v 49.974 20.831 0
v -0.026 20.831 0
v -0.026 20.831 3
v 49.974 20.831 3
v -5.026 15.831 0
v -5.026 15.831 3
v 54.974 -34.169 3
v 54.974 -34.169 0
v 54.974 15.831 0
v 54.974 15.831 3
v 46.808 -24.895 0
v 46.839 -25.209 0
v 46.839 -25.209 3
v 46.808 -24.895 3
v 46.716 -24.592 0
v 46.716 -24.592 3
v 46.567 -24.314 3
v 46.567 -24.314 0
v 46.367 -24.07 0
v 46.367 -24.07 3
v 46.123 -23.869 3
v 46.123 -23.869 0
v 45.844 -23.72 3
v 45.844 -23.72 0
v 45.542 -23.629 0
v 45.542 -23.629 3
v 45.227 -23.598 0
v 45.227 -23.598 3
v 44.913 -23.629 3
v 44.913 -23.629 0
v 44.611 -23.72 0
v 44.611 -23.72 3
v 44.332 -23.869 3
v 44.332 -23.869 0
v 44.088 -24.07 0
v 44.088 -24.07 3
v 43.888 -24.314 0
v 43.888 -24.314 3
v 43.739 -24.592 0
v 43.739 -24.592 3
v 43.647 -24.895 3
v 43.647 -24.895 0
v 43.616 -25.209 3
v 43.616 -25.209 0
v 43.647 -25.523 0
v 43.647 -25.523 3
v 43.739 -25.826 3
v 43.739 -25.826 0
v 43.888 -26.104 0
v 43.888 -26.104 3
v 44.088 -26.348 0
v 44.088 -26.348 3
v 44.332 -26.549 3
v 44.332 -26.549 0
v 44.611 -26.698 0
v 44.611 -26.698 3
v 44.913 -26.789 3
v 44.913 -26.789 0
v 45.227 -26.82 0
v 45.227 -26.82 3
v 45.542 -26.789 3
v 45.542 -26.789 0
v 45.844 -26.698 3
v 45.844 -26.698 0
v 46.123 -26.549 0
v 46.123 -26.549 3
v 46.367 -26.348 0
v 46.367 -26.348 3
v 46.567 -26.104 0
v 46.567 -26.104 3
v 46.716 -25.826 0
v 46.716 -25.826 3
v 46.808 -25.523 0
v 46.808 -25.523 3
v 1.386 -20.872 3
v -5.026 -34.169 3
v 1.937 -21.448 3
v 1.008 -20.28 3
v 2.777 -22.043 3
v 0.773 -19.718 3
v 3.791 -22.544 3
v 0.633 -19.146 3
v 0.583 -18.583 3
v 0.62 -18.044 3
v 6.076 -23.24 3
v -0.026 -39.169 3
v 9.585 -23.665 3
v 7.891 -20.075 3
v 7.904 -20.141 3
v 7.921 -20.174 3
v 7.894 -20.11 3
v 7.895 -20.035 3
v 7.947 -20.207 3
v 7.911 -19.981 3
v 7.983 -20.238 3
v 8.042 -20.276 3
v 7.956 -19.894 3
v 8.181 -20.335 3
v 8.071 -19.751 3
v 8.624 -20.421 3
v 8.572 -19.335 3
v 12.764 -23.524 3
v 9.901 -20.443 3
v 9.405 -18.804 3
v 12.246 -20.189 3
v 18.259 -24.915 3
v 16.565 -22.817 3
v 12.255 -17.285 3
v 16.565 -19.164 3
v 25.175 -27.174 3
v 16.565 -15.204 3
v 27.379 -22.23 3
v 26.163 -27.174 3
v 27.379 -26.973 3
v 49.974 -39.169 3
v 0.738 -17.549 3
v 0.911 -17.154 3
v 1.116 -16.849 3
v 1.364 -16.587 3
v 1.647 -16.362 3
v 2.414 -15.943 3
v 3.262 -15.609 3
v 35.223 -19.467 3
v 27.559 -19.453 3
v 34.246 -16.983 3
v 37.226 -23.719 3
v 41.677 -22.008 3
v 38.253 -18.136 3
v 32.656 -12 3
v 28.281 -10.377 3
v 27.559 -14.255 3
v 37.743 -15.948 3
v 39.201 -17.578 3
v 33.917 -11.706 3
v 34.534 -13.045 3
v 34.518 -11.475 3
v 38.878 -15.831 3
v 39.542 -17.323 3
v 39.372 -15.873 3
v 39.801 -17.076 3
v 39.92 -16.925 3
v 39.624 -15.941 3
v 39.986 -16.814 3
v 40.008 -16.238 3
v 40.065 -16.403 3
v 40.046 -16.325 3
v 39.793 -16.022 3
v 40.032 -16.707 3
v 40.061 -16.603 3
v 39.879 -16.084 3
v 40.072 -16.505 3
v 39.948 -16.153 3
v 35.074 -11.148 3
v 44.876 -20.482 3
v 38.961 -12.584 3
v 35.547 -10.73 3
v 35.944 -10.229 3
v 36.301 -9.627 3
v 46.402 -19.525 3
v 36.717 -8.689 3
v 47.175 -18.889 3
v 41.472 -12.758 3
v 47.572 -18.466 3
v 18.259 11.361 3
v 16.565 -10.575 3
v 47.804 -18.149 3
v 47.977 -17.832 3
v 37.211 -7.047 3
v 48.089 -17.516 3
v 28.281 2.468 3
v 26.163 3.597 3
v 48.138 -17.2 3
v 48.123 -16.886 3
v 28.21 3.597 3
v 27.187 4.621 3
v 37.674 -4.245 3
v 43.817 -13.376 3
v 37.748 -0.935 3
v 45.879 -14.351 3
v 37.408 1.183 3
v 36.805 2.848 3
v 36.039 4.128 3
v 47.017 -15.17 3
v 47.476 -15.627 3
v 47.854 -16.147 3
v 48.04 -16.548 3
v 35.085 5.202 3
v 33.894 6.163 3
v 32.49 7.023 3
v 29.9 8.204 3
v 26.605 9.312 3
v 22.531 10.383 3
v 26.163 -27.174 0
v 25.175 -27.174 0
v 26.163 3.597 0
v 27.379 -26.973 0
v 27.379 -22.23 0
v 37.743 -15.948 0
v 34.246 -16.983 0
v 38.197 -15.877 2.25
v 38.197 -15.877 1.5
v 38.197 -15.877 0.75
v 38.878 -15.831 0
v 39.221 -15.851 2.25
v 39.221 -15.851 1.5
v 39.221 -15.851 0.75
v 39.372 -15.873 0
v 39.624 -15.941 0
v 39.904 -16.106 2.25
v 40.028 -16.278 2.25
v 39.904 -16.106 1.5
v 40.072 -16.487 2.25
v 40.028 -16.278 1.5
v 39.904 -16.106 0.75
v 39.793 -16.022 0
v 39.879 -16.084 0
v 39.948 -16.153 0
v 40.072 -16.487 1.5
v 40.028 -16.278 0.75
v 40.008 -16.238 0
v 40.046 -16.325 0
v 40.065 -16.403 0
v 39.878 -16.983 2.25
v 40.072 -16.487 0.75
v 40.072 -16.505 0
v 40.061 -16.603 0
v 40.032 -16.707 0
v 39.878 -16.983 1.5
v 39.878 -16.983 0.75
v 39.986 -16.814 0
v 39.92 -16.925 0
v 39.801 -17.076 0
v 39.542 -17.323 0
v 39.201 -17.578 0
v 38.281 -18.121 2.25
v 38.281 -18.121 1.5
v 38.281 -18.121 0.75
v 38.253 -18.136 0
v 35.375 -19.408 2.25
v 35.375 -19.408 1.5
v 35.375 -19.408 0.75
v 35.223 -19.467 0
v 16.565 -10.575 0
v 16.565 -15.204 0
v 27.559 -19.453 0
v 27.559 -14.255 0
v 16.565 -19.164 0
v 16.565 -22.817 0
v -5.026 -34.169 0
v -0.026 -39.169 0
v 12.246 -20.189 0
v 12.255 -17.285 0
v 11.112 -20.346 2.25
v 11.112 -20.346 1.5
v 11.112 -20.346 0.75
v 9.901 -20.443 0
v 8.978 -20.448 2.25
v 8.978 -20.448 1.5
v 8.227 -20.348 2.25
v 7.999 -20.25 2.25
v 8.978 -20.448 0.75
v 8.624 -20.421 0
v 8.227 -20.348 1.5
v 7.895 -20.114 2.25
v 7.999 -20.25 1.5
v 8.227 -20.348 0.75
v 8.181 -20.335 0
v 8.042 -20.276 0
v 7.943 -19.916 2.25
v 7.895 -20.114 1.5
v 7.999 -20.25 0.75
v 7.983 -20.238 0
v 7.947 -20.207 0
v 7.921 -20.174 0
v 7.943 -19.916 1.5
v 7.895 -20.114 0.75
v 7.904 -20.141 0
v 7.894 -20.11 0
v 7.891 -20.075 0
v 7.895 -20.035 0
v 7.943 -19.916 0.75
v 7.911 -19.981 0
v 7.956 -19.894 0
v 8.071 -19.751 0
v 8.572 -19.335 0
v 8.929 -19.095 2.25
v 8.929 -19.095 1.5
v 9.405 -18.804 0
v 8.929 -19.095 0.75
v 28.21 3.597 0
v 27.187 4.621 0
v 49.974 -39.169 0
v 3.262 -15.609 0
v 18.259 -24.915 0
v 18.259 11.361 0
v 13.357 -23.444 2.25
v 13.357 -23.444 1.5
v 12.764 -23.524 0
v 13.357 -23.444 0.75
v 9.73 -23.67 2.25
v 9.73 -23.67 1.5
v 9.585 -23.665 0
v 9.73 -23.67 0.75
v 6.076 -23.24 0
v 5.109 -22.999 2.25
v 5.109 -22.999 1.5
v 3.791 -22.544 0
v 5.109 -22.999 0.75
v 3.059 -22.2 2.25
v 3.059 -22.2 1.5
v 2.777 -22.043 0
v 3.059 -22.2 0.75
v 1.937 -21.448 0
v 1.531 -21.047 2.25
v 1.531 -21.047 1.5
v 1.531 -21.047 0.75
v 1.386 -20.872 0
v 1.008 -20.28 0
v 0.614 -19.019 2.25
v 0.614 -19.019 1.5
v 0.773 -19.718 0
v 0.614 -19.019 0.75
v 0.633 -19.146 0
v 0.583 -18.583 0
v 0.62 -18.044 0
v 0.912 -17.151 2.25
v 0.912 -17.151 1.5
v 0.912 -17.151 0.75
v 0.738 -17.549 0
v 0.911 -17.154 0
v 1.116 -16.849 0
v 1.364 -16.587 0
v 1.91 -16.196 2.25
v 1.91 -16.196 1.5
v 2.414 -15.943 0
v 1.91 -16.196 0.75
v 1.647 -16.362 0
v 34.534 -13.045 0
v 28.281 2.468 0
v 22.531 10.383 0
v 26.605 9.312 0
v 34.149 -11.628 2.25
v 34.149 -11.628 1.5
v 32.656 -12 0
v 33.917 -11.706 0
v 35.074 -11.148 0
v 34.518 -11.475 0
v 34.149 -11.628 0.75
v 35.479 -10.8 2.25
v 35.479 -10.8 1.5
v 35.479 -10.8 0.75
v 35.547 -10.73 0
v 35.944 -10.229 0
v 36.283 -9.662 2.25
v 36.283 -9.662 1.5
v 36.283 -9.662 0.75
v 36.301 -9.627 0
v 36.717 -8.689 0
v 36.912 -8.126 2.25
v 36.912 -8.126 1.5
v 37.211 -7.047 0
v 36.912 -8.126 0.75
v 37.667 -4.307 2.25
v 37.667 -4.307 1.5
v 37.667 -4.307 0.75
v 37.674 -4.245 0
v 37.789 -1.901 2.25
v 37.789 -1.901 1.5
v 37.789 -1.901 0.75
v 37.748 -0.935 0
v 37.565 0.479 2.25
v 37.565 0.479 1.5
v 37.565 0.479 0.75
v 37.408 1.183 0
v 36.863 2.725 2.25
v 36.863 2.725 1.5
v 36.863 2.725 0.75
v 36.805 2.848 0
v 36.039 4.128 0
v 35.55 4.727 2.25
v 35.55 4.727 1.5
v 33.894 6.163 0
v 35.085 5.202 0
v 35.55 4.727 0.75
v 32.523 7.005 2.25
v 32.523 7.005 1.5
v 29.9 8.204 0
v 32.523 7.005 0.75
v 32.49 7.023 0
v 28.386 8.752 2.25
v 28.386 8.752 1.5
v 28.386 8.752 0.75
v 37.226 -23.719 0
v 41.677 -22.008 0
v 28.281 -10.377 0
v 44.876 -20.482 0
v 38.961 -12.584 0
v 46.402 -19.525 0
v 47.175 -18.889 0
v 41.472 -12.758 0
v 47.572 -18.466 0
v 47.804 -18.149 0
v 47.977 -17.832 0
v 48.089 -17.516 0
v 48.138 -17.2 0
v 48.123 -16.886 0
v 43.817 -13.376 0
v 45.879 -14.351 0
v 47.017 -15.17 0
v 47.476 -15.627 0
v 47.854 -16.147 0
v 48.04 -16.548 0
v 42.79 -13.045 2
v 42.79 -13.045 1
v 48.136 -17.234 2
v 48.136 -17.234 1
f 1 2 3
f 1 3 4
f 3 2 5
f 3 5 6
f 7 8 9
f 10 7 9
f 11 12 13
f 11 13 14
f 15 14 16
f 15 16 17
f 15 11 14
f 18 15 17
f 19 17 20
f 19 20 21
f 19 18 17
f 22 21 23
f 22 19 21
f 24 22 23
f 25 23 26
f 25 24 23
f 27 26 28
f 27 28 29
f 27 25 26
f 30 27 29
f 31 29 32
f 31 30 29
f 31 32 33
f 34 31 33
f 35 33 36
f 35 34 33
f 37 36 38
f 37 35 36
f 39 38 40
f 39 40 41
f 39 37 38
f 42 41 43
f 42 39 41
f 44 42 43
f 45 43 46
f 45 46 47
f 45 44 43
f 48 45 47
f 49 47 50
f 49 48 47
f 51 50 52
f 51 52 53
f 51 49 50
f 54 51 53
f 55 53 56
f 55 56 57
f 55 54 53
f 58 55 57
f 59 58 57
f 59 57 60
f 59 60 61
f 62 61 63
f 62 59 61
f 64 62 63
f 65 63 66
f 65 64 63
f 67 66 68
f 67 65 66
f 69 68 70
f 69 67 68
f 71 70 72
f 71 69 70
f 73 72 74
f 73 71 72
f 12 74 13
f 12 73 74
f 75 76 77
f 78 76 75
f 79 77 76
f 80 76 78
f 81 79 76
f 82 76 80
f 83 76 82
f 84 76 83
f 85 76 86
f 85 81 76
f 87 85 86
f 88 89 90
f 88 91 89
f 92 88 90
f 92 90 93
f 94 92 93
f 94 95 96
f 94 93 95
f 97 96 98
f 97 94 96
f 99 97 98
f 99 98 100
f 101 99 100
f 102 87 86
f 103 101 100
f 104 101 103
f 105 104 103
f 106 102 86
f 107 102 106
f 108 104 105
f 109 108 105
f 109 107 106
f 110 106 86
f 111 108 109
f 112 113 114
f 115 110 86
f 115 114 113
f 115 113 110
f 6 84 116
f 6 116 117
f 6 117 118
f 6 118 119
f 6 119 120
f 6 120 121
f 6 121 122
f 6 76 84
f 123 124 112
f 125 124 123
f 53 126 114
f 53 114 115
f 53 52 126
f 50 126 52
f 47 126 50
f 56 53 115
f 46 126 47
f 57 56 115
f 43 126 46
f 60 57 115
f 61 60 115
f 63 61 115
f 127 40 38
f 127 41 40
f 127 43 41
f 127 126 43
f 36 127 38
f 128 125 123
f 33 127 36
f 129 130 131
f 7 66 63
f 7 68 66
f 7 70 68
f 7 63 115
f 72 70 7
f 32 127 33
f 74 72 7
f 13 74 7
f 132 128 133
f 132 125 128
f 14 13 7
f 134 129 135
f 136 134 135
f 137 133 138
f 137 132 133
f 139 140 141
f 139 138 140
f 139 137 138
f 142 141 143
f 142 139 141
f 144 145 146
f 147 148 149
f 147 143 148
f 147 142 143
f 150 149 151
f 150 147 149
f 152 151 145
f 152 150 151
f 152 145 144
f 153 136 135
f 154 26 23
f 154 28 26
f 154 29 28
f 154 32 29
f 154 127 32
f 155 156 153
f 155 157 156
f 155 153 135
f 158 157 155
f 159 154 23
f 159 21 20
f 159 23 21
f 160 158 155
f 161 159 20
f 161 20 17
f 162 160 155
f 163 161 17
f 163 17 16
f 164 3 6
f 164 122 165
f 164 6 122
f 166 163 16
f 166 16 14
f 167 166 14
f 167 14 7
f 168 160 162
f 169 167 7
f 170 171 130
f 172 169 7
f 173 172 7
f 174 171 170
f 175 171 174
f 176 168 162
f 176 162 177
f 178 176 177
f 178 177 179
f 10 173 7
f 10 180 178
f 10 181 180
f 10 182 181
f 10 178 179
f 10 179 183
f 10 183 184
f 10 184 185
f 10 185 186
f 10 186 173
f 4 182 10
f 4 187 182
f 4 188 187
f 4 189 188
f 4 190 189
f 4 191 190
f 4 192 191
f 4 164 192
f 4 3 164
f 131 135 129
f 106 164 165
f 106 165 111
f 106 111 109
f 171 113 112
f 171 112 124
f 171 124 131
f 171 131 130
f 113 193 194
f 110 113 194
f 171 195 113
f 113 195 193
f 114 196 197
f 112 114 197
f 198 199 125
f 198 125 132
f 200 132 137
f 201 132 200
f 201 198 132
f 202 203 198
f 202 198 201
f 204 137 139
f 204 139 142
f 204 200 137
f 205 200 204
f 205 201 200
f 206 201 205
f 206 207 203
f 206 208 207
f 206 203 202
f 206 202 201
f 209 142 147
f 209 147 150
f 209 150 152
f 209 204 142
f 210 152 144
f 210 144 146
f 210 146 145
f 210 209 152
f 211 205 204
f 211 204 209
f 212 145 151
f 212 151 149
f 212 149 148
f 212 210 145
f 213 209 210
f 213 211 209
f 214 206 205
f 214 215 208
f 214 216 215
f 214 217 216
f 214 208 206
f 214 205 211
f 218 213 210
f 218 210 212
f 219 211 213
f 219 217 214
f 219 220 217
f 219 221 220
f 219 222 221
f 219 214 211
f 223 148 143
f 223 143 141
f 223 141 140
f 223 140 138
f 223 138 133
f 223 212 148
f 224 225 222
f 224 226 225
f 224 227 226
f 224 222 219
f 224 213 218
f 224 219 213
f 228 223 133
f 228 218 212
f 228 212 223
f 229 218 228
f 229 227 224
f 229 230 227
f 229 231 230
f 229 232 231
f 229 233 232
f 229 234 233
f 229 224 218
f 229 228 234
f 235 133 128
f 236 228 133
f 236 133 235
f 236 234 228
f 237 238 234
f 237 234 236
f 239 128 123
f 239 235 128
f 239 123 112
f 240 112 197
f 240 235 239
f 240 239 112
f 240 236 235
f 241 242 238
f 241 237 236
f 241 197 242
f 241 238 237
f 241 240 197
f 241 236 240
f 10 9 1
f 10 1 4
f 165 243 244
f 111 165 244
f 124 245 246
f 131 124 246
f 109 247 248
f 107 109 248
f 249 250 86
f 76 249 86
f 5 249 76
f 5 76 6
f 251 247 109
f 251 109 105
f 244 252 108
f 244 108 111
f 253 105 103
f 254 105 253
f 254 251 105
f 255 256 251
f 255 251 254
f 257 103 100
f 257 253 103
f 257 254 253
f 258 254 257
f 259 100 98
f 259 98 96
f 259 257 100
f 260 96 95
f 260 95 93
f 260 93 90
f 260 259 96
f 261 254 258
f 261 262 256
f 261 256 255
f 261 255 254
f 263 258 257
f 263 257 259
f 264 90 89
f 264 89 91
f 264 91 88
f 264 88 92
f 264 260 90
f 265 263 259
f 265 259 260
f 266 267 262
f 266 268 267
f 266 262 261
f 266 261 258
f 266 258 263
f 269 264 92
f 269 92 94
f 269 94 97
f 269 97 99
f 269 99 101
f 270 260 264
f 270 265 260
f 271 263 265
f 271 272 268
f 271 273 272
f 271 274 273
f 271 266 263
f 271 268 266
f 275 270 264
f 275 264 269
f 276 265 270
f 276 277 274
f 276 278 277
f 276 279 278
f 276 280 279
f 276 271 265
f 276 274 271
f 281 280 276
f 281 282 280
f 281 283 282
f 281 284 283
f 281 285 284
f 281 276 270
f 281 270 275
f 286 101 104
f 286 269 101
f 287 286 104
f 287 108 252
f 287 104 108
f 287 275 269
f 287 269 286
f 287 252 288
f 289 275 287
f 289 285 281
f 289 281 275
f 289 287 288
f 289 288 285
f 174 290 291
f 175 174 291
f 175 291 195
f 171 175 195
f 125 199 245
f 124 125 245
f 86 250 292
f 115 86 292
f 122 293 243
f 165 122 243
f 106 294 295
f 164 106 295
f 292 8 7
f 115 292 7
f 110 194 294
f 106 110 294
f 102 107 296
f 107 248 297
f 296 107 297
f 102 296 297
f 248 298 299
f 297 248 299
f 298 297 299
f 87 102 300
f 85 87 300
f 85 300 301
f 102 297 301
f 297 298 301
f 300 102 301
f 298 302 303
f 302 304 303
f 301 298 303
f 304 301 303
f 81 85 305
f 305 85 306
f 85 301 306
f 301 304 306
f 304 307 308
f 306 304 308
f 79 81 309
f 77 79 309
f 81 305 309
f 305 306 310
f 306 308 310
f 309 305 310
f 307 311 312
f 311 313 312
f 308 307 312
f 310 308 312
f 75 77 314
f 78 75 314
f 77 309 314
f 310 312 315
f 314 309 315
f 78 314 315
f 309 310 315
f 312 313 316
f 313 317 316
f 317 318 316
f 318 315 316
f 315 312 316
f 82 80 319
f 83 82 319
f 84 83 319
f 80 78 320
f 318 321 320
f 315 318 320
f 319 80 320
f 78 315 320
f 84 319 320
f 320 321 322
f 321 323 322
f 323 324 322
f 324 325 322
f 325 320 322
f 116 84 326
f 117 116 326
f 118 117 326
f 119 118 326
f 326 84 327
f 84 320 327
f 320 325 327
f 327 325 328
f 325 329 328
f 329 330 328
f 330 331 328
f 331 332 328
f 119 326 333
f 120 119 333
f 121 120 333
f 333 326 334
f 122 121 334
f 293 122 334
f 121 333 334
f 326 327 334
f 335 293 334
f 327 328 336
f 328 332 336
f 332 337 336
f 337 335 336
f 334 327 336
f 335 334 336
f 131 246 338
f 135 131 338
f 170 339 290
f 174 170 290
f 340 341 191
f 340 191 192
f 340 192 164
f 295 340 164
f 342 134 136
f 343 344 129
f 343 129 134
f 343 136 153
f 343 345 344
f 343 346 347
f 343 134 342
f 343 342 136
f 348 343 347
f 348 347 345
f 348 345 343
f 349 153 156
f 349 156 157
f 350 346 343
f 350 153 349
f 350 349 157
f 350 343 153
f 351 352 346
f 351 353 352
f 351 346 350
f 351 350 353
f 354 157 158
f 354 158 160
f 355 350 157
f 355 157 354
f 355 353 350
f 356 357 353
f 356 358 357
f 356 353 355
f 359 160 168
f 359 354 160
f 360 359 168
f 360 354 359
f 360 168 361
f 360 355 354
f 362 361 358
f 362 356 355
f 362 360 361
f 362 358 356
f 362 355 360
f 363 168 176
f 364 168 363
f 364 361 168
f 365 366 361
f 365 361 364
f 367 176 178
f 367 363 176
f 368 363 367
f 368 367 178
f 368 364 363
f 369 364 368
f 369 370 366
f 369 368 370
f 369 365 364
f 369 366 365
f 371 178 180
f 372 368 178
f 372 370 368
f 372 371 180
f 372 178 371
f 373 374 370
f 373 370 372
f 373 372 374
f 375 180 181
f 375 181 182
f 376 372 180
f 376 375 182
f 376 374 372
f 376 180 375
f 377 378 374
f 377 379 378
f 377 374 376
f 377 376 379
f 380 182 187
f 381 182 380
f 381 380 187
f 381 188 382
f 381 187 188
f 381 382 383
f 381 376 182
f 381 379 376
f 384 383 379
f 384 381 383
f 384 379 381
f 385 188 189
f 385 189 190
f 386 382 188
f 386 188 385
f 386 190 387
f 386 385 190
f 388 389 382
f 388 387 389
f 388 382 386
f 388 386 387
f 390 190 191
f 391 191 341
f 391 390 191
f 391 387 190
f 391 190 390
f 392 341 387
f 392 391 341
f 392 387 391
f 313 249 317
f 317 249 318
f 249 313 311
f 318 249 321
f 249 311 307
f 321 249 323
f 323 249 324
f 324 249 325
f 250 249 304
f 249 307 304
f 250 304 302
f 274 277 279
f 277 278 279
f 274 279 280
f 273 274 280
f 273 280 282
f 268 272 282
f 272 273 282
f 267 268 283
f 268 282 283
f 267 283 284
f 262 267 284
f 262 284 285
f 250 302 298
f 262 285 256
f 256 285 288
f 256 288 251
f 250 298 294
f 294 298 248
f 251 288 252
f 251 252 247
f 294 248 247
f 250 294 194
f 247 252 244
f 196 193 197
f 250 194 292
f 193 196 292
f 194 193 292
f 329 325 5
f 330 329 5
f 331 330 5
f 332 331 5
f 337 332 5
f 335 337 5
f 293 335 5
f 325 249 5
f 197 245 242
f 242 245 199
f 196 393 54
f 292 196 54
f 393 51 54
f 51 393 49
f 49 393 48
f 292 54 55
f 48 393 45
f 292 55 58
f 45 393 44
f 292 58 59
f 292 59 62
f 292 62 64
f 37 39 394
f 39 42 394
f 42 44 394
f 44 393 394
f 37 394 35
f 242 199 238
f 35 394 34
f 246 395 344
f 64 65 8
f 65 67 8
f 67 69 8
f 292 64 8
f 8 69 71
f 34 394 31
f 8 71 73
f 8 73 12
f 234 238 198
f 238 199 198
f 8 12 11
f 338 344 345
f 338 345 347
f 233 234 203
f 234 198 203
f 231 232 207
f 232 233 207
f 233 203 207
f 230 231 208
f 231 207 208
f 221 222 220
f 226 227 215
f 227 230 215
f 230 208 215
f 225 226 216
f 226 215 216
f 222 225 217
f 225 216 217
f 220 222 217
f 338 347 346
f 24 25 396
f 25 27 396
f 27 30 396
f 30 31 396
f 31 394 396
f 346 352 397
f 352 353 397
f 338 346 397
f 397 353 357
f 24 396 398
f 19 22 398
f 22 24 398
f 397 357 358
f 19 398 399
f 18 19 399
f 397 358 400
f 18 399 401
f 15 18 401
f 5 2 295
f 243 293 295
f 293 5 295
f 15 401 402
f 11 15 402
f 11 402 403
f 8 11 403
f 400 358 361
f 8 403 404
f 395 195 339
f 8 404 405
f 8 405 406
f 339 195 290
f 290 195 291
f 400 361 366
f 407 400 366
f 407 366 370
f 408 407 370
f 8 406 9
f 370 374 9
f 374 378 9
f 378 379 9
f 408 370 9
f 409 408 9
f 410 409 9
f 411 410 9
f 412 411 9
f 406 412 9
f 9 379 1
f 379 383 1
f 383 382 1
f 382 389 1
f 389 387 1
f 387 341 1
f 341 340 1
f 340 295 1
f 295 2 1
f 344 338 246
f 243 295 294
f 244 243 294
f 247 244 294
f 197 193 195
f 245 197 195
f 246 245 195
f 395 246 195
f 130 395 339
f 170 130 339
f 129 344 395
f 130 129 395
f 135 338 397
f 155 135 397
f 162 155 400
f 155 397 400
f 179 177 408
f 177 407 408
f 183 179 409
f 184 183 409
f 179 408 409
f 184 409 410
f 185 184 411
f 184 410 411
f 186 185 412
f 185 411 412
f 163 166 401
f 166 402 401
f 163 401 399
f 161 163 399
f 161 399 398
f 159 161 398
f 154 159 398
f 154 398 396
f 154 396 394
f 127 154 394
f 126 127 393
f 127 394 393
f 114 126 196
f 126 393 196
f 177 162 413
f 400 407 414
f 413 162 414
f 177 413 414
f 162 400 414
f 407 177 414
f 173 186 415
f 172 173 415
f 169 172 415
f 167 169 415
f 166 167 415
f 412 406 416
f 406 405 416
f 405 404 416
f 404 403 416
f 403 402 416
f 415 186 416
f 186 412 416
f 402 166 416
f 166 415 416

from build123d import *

# Parameters (mm, degrees)
F0_W     = 60
F0_H     = 60
F0_R     = 1.6112939769
F1_DEPTH = 3
F2_SIZE  = 5


with BuildPart() as f1:
    # F0 (on Top) → F1 (new body)
    with BuildSketch(Plane.XY):
        with Locations((24.9740350166, -9.1694972429)):
            Rectangle(F0_W, F0_H)
        with BuildLine():
            Line((3.2622774597, -15.6086981297), (16.5645107627, -10.5752451345))
            Line((16.5645107627, -10.5752451345), (16.5645107627, -15.204295516))
            add(Edge.make_bspline(
                [(16.5645107627, -19.1635359079), (14.8224645411, -19.6451143125), (11.7558446548, -20.4928632954), (6.1547440409, -20.5448956868), (11.8429032498, -17.426394245), (14.8983947786, -15.9884085963), (16.5645107627, -15.204295516)],
                knots=[0, 0, 0, 0, 0.2743421374, 0.4829395706, 0.7180543169, 1, 1, 1, 1], degree=3))
            Line((16.5645107627, -19.1635359079), (16.5645107627, -22.8168163449))
            add(Edge.make_bspline(
                [(16.5645107627, -22.8168163449), (14.4725531382, -23.2798512694), (10.0419202377, -24.2605297243), (0.6256088462, -22.3279022421), (0.2660082773, -16.7243281021), (2.3214114275, -15.9590199071), (3.2622774597, -15.6086981297)],
                knots=[0, 0, 0, 0, 0.2846115058, 0.6027890272, 0.8181756645, 1, 1, 1, 1], degree=3))
        make_face(mode=Mode.SUBTRACT)
        with Locations((45.2274344862, -25.2090897411)):
            Circle(F0_R, mode=Mode.SUBTRACT)
        with BuildLine():
            Line((27.5594554842, -19.4526854903), (27.5594554842, -14.2551343888))
            Line((27.5594554842, -14.2551343888), (34.5340929925, -13.0454646423))
            add(Edge.make_bspline(
                [(34.5340929925, -13.0454646423), (37.2063908175, -12.6439263534), (42.3024714088, -11.8781915384), (53.478633217, -18.6523955934), (37.6371992304, -23.7025636039), (27.378866449, -26.9728675485)],
                knots=[0, 0, 0, 0, 0.2798359986, 0.5336481539, 1, 1, 1, 1], degree=3))
            Line((27.378866449, -26.9728675485), (27.378866449, -22.2297701985))
            add(Edge.make_bspline(
                [(34.2456139624, -16.9829949737), (35.640261338, -16.5033856088), (37.9383903882, -15.7130752885), (40.0731287249, -15.8571844549), (40.2704488484, -17.8896647841), (33.0974326396, -20.3045464891), (27.378866449, -22.2297701985)],
                knots=[0, 0, 0, 0, 0.2546068482, 0.4195464779, 0.5372432196, 1, 1, 1, 1], degree=3))
            Line((34.2456139624, -16.9829949737), (27.5594554842, -19.4526854903))
        make_face(mode=Mode.SUBTRACT)
        with BuildLine():
            Line((18.2588193566, -24.9153450131), (18.2588193566, 11.3608455285))
            add(Edge.make_bspline(
                [(32.6563753188, -11.9998930022), (33.6693549813, -11.8025701643), (36.1962896301, -11.3103372651), (38.2049388483, -4.0554139358), (37.4316089742, 7.077116303), (25.3393667705, 9.7788562356), (18.2588193566, 11.3608455285)],
                knots=[0, 0, 0, 0, 0.1494558255, 0.3728259491, 0.6327616062, 1, 1, 1, 1], degree=3))
            Line((32.6563753188, -11.9998930022), (28.2806474715, -10.3766387329))
            Line((28.2806474715, -10.3766387329), (28.2806474715, 2.468238119))
            Line((28.2806474715, 2.468238119), (28.2100718468, 3.597458126))
            Line((28.2100718468, 3.597458126), (27.1867176699, 4.6208149288))
            Line((27.1867176699, 4.6208149288), (26.1633582413, 3.597458126))
            Line((26.1633582413, 3.597458126), (26.1633582413, 1.7624760512))
            Line((26.1633582413, 1.7624760512), (26.1633582413, -27.1737873554))
            Line((26.1633582413, -27.1737873554), (25.1752920449, -27.1737873554))
            Line((25.1752920449, -27.1737873554), (18.2588193566, -24.9153450131))
        make_face(mode=Mode.SUBTRACT)
    extrude(amount=F1_DEPTH)

    # F2
    f2_edges = [f1.edges().sort_by_distance(p)[0] for p in [
        (-5.025965, 20.830503, 1.5),
        (-5.025965, -39.169497, 1.5),
        (54.974035, -39.169497, 1.5),
        (54.974035, 20.830503, 1.5),
    ]]
    chamfer(f2_edges, length=F2_SIZE)


solid = f1.part
